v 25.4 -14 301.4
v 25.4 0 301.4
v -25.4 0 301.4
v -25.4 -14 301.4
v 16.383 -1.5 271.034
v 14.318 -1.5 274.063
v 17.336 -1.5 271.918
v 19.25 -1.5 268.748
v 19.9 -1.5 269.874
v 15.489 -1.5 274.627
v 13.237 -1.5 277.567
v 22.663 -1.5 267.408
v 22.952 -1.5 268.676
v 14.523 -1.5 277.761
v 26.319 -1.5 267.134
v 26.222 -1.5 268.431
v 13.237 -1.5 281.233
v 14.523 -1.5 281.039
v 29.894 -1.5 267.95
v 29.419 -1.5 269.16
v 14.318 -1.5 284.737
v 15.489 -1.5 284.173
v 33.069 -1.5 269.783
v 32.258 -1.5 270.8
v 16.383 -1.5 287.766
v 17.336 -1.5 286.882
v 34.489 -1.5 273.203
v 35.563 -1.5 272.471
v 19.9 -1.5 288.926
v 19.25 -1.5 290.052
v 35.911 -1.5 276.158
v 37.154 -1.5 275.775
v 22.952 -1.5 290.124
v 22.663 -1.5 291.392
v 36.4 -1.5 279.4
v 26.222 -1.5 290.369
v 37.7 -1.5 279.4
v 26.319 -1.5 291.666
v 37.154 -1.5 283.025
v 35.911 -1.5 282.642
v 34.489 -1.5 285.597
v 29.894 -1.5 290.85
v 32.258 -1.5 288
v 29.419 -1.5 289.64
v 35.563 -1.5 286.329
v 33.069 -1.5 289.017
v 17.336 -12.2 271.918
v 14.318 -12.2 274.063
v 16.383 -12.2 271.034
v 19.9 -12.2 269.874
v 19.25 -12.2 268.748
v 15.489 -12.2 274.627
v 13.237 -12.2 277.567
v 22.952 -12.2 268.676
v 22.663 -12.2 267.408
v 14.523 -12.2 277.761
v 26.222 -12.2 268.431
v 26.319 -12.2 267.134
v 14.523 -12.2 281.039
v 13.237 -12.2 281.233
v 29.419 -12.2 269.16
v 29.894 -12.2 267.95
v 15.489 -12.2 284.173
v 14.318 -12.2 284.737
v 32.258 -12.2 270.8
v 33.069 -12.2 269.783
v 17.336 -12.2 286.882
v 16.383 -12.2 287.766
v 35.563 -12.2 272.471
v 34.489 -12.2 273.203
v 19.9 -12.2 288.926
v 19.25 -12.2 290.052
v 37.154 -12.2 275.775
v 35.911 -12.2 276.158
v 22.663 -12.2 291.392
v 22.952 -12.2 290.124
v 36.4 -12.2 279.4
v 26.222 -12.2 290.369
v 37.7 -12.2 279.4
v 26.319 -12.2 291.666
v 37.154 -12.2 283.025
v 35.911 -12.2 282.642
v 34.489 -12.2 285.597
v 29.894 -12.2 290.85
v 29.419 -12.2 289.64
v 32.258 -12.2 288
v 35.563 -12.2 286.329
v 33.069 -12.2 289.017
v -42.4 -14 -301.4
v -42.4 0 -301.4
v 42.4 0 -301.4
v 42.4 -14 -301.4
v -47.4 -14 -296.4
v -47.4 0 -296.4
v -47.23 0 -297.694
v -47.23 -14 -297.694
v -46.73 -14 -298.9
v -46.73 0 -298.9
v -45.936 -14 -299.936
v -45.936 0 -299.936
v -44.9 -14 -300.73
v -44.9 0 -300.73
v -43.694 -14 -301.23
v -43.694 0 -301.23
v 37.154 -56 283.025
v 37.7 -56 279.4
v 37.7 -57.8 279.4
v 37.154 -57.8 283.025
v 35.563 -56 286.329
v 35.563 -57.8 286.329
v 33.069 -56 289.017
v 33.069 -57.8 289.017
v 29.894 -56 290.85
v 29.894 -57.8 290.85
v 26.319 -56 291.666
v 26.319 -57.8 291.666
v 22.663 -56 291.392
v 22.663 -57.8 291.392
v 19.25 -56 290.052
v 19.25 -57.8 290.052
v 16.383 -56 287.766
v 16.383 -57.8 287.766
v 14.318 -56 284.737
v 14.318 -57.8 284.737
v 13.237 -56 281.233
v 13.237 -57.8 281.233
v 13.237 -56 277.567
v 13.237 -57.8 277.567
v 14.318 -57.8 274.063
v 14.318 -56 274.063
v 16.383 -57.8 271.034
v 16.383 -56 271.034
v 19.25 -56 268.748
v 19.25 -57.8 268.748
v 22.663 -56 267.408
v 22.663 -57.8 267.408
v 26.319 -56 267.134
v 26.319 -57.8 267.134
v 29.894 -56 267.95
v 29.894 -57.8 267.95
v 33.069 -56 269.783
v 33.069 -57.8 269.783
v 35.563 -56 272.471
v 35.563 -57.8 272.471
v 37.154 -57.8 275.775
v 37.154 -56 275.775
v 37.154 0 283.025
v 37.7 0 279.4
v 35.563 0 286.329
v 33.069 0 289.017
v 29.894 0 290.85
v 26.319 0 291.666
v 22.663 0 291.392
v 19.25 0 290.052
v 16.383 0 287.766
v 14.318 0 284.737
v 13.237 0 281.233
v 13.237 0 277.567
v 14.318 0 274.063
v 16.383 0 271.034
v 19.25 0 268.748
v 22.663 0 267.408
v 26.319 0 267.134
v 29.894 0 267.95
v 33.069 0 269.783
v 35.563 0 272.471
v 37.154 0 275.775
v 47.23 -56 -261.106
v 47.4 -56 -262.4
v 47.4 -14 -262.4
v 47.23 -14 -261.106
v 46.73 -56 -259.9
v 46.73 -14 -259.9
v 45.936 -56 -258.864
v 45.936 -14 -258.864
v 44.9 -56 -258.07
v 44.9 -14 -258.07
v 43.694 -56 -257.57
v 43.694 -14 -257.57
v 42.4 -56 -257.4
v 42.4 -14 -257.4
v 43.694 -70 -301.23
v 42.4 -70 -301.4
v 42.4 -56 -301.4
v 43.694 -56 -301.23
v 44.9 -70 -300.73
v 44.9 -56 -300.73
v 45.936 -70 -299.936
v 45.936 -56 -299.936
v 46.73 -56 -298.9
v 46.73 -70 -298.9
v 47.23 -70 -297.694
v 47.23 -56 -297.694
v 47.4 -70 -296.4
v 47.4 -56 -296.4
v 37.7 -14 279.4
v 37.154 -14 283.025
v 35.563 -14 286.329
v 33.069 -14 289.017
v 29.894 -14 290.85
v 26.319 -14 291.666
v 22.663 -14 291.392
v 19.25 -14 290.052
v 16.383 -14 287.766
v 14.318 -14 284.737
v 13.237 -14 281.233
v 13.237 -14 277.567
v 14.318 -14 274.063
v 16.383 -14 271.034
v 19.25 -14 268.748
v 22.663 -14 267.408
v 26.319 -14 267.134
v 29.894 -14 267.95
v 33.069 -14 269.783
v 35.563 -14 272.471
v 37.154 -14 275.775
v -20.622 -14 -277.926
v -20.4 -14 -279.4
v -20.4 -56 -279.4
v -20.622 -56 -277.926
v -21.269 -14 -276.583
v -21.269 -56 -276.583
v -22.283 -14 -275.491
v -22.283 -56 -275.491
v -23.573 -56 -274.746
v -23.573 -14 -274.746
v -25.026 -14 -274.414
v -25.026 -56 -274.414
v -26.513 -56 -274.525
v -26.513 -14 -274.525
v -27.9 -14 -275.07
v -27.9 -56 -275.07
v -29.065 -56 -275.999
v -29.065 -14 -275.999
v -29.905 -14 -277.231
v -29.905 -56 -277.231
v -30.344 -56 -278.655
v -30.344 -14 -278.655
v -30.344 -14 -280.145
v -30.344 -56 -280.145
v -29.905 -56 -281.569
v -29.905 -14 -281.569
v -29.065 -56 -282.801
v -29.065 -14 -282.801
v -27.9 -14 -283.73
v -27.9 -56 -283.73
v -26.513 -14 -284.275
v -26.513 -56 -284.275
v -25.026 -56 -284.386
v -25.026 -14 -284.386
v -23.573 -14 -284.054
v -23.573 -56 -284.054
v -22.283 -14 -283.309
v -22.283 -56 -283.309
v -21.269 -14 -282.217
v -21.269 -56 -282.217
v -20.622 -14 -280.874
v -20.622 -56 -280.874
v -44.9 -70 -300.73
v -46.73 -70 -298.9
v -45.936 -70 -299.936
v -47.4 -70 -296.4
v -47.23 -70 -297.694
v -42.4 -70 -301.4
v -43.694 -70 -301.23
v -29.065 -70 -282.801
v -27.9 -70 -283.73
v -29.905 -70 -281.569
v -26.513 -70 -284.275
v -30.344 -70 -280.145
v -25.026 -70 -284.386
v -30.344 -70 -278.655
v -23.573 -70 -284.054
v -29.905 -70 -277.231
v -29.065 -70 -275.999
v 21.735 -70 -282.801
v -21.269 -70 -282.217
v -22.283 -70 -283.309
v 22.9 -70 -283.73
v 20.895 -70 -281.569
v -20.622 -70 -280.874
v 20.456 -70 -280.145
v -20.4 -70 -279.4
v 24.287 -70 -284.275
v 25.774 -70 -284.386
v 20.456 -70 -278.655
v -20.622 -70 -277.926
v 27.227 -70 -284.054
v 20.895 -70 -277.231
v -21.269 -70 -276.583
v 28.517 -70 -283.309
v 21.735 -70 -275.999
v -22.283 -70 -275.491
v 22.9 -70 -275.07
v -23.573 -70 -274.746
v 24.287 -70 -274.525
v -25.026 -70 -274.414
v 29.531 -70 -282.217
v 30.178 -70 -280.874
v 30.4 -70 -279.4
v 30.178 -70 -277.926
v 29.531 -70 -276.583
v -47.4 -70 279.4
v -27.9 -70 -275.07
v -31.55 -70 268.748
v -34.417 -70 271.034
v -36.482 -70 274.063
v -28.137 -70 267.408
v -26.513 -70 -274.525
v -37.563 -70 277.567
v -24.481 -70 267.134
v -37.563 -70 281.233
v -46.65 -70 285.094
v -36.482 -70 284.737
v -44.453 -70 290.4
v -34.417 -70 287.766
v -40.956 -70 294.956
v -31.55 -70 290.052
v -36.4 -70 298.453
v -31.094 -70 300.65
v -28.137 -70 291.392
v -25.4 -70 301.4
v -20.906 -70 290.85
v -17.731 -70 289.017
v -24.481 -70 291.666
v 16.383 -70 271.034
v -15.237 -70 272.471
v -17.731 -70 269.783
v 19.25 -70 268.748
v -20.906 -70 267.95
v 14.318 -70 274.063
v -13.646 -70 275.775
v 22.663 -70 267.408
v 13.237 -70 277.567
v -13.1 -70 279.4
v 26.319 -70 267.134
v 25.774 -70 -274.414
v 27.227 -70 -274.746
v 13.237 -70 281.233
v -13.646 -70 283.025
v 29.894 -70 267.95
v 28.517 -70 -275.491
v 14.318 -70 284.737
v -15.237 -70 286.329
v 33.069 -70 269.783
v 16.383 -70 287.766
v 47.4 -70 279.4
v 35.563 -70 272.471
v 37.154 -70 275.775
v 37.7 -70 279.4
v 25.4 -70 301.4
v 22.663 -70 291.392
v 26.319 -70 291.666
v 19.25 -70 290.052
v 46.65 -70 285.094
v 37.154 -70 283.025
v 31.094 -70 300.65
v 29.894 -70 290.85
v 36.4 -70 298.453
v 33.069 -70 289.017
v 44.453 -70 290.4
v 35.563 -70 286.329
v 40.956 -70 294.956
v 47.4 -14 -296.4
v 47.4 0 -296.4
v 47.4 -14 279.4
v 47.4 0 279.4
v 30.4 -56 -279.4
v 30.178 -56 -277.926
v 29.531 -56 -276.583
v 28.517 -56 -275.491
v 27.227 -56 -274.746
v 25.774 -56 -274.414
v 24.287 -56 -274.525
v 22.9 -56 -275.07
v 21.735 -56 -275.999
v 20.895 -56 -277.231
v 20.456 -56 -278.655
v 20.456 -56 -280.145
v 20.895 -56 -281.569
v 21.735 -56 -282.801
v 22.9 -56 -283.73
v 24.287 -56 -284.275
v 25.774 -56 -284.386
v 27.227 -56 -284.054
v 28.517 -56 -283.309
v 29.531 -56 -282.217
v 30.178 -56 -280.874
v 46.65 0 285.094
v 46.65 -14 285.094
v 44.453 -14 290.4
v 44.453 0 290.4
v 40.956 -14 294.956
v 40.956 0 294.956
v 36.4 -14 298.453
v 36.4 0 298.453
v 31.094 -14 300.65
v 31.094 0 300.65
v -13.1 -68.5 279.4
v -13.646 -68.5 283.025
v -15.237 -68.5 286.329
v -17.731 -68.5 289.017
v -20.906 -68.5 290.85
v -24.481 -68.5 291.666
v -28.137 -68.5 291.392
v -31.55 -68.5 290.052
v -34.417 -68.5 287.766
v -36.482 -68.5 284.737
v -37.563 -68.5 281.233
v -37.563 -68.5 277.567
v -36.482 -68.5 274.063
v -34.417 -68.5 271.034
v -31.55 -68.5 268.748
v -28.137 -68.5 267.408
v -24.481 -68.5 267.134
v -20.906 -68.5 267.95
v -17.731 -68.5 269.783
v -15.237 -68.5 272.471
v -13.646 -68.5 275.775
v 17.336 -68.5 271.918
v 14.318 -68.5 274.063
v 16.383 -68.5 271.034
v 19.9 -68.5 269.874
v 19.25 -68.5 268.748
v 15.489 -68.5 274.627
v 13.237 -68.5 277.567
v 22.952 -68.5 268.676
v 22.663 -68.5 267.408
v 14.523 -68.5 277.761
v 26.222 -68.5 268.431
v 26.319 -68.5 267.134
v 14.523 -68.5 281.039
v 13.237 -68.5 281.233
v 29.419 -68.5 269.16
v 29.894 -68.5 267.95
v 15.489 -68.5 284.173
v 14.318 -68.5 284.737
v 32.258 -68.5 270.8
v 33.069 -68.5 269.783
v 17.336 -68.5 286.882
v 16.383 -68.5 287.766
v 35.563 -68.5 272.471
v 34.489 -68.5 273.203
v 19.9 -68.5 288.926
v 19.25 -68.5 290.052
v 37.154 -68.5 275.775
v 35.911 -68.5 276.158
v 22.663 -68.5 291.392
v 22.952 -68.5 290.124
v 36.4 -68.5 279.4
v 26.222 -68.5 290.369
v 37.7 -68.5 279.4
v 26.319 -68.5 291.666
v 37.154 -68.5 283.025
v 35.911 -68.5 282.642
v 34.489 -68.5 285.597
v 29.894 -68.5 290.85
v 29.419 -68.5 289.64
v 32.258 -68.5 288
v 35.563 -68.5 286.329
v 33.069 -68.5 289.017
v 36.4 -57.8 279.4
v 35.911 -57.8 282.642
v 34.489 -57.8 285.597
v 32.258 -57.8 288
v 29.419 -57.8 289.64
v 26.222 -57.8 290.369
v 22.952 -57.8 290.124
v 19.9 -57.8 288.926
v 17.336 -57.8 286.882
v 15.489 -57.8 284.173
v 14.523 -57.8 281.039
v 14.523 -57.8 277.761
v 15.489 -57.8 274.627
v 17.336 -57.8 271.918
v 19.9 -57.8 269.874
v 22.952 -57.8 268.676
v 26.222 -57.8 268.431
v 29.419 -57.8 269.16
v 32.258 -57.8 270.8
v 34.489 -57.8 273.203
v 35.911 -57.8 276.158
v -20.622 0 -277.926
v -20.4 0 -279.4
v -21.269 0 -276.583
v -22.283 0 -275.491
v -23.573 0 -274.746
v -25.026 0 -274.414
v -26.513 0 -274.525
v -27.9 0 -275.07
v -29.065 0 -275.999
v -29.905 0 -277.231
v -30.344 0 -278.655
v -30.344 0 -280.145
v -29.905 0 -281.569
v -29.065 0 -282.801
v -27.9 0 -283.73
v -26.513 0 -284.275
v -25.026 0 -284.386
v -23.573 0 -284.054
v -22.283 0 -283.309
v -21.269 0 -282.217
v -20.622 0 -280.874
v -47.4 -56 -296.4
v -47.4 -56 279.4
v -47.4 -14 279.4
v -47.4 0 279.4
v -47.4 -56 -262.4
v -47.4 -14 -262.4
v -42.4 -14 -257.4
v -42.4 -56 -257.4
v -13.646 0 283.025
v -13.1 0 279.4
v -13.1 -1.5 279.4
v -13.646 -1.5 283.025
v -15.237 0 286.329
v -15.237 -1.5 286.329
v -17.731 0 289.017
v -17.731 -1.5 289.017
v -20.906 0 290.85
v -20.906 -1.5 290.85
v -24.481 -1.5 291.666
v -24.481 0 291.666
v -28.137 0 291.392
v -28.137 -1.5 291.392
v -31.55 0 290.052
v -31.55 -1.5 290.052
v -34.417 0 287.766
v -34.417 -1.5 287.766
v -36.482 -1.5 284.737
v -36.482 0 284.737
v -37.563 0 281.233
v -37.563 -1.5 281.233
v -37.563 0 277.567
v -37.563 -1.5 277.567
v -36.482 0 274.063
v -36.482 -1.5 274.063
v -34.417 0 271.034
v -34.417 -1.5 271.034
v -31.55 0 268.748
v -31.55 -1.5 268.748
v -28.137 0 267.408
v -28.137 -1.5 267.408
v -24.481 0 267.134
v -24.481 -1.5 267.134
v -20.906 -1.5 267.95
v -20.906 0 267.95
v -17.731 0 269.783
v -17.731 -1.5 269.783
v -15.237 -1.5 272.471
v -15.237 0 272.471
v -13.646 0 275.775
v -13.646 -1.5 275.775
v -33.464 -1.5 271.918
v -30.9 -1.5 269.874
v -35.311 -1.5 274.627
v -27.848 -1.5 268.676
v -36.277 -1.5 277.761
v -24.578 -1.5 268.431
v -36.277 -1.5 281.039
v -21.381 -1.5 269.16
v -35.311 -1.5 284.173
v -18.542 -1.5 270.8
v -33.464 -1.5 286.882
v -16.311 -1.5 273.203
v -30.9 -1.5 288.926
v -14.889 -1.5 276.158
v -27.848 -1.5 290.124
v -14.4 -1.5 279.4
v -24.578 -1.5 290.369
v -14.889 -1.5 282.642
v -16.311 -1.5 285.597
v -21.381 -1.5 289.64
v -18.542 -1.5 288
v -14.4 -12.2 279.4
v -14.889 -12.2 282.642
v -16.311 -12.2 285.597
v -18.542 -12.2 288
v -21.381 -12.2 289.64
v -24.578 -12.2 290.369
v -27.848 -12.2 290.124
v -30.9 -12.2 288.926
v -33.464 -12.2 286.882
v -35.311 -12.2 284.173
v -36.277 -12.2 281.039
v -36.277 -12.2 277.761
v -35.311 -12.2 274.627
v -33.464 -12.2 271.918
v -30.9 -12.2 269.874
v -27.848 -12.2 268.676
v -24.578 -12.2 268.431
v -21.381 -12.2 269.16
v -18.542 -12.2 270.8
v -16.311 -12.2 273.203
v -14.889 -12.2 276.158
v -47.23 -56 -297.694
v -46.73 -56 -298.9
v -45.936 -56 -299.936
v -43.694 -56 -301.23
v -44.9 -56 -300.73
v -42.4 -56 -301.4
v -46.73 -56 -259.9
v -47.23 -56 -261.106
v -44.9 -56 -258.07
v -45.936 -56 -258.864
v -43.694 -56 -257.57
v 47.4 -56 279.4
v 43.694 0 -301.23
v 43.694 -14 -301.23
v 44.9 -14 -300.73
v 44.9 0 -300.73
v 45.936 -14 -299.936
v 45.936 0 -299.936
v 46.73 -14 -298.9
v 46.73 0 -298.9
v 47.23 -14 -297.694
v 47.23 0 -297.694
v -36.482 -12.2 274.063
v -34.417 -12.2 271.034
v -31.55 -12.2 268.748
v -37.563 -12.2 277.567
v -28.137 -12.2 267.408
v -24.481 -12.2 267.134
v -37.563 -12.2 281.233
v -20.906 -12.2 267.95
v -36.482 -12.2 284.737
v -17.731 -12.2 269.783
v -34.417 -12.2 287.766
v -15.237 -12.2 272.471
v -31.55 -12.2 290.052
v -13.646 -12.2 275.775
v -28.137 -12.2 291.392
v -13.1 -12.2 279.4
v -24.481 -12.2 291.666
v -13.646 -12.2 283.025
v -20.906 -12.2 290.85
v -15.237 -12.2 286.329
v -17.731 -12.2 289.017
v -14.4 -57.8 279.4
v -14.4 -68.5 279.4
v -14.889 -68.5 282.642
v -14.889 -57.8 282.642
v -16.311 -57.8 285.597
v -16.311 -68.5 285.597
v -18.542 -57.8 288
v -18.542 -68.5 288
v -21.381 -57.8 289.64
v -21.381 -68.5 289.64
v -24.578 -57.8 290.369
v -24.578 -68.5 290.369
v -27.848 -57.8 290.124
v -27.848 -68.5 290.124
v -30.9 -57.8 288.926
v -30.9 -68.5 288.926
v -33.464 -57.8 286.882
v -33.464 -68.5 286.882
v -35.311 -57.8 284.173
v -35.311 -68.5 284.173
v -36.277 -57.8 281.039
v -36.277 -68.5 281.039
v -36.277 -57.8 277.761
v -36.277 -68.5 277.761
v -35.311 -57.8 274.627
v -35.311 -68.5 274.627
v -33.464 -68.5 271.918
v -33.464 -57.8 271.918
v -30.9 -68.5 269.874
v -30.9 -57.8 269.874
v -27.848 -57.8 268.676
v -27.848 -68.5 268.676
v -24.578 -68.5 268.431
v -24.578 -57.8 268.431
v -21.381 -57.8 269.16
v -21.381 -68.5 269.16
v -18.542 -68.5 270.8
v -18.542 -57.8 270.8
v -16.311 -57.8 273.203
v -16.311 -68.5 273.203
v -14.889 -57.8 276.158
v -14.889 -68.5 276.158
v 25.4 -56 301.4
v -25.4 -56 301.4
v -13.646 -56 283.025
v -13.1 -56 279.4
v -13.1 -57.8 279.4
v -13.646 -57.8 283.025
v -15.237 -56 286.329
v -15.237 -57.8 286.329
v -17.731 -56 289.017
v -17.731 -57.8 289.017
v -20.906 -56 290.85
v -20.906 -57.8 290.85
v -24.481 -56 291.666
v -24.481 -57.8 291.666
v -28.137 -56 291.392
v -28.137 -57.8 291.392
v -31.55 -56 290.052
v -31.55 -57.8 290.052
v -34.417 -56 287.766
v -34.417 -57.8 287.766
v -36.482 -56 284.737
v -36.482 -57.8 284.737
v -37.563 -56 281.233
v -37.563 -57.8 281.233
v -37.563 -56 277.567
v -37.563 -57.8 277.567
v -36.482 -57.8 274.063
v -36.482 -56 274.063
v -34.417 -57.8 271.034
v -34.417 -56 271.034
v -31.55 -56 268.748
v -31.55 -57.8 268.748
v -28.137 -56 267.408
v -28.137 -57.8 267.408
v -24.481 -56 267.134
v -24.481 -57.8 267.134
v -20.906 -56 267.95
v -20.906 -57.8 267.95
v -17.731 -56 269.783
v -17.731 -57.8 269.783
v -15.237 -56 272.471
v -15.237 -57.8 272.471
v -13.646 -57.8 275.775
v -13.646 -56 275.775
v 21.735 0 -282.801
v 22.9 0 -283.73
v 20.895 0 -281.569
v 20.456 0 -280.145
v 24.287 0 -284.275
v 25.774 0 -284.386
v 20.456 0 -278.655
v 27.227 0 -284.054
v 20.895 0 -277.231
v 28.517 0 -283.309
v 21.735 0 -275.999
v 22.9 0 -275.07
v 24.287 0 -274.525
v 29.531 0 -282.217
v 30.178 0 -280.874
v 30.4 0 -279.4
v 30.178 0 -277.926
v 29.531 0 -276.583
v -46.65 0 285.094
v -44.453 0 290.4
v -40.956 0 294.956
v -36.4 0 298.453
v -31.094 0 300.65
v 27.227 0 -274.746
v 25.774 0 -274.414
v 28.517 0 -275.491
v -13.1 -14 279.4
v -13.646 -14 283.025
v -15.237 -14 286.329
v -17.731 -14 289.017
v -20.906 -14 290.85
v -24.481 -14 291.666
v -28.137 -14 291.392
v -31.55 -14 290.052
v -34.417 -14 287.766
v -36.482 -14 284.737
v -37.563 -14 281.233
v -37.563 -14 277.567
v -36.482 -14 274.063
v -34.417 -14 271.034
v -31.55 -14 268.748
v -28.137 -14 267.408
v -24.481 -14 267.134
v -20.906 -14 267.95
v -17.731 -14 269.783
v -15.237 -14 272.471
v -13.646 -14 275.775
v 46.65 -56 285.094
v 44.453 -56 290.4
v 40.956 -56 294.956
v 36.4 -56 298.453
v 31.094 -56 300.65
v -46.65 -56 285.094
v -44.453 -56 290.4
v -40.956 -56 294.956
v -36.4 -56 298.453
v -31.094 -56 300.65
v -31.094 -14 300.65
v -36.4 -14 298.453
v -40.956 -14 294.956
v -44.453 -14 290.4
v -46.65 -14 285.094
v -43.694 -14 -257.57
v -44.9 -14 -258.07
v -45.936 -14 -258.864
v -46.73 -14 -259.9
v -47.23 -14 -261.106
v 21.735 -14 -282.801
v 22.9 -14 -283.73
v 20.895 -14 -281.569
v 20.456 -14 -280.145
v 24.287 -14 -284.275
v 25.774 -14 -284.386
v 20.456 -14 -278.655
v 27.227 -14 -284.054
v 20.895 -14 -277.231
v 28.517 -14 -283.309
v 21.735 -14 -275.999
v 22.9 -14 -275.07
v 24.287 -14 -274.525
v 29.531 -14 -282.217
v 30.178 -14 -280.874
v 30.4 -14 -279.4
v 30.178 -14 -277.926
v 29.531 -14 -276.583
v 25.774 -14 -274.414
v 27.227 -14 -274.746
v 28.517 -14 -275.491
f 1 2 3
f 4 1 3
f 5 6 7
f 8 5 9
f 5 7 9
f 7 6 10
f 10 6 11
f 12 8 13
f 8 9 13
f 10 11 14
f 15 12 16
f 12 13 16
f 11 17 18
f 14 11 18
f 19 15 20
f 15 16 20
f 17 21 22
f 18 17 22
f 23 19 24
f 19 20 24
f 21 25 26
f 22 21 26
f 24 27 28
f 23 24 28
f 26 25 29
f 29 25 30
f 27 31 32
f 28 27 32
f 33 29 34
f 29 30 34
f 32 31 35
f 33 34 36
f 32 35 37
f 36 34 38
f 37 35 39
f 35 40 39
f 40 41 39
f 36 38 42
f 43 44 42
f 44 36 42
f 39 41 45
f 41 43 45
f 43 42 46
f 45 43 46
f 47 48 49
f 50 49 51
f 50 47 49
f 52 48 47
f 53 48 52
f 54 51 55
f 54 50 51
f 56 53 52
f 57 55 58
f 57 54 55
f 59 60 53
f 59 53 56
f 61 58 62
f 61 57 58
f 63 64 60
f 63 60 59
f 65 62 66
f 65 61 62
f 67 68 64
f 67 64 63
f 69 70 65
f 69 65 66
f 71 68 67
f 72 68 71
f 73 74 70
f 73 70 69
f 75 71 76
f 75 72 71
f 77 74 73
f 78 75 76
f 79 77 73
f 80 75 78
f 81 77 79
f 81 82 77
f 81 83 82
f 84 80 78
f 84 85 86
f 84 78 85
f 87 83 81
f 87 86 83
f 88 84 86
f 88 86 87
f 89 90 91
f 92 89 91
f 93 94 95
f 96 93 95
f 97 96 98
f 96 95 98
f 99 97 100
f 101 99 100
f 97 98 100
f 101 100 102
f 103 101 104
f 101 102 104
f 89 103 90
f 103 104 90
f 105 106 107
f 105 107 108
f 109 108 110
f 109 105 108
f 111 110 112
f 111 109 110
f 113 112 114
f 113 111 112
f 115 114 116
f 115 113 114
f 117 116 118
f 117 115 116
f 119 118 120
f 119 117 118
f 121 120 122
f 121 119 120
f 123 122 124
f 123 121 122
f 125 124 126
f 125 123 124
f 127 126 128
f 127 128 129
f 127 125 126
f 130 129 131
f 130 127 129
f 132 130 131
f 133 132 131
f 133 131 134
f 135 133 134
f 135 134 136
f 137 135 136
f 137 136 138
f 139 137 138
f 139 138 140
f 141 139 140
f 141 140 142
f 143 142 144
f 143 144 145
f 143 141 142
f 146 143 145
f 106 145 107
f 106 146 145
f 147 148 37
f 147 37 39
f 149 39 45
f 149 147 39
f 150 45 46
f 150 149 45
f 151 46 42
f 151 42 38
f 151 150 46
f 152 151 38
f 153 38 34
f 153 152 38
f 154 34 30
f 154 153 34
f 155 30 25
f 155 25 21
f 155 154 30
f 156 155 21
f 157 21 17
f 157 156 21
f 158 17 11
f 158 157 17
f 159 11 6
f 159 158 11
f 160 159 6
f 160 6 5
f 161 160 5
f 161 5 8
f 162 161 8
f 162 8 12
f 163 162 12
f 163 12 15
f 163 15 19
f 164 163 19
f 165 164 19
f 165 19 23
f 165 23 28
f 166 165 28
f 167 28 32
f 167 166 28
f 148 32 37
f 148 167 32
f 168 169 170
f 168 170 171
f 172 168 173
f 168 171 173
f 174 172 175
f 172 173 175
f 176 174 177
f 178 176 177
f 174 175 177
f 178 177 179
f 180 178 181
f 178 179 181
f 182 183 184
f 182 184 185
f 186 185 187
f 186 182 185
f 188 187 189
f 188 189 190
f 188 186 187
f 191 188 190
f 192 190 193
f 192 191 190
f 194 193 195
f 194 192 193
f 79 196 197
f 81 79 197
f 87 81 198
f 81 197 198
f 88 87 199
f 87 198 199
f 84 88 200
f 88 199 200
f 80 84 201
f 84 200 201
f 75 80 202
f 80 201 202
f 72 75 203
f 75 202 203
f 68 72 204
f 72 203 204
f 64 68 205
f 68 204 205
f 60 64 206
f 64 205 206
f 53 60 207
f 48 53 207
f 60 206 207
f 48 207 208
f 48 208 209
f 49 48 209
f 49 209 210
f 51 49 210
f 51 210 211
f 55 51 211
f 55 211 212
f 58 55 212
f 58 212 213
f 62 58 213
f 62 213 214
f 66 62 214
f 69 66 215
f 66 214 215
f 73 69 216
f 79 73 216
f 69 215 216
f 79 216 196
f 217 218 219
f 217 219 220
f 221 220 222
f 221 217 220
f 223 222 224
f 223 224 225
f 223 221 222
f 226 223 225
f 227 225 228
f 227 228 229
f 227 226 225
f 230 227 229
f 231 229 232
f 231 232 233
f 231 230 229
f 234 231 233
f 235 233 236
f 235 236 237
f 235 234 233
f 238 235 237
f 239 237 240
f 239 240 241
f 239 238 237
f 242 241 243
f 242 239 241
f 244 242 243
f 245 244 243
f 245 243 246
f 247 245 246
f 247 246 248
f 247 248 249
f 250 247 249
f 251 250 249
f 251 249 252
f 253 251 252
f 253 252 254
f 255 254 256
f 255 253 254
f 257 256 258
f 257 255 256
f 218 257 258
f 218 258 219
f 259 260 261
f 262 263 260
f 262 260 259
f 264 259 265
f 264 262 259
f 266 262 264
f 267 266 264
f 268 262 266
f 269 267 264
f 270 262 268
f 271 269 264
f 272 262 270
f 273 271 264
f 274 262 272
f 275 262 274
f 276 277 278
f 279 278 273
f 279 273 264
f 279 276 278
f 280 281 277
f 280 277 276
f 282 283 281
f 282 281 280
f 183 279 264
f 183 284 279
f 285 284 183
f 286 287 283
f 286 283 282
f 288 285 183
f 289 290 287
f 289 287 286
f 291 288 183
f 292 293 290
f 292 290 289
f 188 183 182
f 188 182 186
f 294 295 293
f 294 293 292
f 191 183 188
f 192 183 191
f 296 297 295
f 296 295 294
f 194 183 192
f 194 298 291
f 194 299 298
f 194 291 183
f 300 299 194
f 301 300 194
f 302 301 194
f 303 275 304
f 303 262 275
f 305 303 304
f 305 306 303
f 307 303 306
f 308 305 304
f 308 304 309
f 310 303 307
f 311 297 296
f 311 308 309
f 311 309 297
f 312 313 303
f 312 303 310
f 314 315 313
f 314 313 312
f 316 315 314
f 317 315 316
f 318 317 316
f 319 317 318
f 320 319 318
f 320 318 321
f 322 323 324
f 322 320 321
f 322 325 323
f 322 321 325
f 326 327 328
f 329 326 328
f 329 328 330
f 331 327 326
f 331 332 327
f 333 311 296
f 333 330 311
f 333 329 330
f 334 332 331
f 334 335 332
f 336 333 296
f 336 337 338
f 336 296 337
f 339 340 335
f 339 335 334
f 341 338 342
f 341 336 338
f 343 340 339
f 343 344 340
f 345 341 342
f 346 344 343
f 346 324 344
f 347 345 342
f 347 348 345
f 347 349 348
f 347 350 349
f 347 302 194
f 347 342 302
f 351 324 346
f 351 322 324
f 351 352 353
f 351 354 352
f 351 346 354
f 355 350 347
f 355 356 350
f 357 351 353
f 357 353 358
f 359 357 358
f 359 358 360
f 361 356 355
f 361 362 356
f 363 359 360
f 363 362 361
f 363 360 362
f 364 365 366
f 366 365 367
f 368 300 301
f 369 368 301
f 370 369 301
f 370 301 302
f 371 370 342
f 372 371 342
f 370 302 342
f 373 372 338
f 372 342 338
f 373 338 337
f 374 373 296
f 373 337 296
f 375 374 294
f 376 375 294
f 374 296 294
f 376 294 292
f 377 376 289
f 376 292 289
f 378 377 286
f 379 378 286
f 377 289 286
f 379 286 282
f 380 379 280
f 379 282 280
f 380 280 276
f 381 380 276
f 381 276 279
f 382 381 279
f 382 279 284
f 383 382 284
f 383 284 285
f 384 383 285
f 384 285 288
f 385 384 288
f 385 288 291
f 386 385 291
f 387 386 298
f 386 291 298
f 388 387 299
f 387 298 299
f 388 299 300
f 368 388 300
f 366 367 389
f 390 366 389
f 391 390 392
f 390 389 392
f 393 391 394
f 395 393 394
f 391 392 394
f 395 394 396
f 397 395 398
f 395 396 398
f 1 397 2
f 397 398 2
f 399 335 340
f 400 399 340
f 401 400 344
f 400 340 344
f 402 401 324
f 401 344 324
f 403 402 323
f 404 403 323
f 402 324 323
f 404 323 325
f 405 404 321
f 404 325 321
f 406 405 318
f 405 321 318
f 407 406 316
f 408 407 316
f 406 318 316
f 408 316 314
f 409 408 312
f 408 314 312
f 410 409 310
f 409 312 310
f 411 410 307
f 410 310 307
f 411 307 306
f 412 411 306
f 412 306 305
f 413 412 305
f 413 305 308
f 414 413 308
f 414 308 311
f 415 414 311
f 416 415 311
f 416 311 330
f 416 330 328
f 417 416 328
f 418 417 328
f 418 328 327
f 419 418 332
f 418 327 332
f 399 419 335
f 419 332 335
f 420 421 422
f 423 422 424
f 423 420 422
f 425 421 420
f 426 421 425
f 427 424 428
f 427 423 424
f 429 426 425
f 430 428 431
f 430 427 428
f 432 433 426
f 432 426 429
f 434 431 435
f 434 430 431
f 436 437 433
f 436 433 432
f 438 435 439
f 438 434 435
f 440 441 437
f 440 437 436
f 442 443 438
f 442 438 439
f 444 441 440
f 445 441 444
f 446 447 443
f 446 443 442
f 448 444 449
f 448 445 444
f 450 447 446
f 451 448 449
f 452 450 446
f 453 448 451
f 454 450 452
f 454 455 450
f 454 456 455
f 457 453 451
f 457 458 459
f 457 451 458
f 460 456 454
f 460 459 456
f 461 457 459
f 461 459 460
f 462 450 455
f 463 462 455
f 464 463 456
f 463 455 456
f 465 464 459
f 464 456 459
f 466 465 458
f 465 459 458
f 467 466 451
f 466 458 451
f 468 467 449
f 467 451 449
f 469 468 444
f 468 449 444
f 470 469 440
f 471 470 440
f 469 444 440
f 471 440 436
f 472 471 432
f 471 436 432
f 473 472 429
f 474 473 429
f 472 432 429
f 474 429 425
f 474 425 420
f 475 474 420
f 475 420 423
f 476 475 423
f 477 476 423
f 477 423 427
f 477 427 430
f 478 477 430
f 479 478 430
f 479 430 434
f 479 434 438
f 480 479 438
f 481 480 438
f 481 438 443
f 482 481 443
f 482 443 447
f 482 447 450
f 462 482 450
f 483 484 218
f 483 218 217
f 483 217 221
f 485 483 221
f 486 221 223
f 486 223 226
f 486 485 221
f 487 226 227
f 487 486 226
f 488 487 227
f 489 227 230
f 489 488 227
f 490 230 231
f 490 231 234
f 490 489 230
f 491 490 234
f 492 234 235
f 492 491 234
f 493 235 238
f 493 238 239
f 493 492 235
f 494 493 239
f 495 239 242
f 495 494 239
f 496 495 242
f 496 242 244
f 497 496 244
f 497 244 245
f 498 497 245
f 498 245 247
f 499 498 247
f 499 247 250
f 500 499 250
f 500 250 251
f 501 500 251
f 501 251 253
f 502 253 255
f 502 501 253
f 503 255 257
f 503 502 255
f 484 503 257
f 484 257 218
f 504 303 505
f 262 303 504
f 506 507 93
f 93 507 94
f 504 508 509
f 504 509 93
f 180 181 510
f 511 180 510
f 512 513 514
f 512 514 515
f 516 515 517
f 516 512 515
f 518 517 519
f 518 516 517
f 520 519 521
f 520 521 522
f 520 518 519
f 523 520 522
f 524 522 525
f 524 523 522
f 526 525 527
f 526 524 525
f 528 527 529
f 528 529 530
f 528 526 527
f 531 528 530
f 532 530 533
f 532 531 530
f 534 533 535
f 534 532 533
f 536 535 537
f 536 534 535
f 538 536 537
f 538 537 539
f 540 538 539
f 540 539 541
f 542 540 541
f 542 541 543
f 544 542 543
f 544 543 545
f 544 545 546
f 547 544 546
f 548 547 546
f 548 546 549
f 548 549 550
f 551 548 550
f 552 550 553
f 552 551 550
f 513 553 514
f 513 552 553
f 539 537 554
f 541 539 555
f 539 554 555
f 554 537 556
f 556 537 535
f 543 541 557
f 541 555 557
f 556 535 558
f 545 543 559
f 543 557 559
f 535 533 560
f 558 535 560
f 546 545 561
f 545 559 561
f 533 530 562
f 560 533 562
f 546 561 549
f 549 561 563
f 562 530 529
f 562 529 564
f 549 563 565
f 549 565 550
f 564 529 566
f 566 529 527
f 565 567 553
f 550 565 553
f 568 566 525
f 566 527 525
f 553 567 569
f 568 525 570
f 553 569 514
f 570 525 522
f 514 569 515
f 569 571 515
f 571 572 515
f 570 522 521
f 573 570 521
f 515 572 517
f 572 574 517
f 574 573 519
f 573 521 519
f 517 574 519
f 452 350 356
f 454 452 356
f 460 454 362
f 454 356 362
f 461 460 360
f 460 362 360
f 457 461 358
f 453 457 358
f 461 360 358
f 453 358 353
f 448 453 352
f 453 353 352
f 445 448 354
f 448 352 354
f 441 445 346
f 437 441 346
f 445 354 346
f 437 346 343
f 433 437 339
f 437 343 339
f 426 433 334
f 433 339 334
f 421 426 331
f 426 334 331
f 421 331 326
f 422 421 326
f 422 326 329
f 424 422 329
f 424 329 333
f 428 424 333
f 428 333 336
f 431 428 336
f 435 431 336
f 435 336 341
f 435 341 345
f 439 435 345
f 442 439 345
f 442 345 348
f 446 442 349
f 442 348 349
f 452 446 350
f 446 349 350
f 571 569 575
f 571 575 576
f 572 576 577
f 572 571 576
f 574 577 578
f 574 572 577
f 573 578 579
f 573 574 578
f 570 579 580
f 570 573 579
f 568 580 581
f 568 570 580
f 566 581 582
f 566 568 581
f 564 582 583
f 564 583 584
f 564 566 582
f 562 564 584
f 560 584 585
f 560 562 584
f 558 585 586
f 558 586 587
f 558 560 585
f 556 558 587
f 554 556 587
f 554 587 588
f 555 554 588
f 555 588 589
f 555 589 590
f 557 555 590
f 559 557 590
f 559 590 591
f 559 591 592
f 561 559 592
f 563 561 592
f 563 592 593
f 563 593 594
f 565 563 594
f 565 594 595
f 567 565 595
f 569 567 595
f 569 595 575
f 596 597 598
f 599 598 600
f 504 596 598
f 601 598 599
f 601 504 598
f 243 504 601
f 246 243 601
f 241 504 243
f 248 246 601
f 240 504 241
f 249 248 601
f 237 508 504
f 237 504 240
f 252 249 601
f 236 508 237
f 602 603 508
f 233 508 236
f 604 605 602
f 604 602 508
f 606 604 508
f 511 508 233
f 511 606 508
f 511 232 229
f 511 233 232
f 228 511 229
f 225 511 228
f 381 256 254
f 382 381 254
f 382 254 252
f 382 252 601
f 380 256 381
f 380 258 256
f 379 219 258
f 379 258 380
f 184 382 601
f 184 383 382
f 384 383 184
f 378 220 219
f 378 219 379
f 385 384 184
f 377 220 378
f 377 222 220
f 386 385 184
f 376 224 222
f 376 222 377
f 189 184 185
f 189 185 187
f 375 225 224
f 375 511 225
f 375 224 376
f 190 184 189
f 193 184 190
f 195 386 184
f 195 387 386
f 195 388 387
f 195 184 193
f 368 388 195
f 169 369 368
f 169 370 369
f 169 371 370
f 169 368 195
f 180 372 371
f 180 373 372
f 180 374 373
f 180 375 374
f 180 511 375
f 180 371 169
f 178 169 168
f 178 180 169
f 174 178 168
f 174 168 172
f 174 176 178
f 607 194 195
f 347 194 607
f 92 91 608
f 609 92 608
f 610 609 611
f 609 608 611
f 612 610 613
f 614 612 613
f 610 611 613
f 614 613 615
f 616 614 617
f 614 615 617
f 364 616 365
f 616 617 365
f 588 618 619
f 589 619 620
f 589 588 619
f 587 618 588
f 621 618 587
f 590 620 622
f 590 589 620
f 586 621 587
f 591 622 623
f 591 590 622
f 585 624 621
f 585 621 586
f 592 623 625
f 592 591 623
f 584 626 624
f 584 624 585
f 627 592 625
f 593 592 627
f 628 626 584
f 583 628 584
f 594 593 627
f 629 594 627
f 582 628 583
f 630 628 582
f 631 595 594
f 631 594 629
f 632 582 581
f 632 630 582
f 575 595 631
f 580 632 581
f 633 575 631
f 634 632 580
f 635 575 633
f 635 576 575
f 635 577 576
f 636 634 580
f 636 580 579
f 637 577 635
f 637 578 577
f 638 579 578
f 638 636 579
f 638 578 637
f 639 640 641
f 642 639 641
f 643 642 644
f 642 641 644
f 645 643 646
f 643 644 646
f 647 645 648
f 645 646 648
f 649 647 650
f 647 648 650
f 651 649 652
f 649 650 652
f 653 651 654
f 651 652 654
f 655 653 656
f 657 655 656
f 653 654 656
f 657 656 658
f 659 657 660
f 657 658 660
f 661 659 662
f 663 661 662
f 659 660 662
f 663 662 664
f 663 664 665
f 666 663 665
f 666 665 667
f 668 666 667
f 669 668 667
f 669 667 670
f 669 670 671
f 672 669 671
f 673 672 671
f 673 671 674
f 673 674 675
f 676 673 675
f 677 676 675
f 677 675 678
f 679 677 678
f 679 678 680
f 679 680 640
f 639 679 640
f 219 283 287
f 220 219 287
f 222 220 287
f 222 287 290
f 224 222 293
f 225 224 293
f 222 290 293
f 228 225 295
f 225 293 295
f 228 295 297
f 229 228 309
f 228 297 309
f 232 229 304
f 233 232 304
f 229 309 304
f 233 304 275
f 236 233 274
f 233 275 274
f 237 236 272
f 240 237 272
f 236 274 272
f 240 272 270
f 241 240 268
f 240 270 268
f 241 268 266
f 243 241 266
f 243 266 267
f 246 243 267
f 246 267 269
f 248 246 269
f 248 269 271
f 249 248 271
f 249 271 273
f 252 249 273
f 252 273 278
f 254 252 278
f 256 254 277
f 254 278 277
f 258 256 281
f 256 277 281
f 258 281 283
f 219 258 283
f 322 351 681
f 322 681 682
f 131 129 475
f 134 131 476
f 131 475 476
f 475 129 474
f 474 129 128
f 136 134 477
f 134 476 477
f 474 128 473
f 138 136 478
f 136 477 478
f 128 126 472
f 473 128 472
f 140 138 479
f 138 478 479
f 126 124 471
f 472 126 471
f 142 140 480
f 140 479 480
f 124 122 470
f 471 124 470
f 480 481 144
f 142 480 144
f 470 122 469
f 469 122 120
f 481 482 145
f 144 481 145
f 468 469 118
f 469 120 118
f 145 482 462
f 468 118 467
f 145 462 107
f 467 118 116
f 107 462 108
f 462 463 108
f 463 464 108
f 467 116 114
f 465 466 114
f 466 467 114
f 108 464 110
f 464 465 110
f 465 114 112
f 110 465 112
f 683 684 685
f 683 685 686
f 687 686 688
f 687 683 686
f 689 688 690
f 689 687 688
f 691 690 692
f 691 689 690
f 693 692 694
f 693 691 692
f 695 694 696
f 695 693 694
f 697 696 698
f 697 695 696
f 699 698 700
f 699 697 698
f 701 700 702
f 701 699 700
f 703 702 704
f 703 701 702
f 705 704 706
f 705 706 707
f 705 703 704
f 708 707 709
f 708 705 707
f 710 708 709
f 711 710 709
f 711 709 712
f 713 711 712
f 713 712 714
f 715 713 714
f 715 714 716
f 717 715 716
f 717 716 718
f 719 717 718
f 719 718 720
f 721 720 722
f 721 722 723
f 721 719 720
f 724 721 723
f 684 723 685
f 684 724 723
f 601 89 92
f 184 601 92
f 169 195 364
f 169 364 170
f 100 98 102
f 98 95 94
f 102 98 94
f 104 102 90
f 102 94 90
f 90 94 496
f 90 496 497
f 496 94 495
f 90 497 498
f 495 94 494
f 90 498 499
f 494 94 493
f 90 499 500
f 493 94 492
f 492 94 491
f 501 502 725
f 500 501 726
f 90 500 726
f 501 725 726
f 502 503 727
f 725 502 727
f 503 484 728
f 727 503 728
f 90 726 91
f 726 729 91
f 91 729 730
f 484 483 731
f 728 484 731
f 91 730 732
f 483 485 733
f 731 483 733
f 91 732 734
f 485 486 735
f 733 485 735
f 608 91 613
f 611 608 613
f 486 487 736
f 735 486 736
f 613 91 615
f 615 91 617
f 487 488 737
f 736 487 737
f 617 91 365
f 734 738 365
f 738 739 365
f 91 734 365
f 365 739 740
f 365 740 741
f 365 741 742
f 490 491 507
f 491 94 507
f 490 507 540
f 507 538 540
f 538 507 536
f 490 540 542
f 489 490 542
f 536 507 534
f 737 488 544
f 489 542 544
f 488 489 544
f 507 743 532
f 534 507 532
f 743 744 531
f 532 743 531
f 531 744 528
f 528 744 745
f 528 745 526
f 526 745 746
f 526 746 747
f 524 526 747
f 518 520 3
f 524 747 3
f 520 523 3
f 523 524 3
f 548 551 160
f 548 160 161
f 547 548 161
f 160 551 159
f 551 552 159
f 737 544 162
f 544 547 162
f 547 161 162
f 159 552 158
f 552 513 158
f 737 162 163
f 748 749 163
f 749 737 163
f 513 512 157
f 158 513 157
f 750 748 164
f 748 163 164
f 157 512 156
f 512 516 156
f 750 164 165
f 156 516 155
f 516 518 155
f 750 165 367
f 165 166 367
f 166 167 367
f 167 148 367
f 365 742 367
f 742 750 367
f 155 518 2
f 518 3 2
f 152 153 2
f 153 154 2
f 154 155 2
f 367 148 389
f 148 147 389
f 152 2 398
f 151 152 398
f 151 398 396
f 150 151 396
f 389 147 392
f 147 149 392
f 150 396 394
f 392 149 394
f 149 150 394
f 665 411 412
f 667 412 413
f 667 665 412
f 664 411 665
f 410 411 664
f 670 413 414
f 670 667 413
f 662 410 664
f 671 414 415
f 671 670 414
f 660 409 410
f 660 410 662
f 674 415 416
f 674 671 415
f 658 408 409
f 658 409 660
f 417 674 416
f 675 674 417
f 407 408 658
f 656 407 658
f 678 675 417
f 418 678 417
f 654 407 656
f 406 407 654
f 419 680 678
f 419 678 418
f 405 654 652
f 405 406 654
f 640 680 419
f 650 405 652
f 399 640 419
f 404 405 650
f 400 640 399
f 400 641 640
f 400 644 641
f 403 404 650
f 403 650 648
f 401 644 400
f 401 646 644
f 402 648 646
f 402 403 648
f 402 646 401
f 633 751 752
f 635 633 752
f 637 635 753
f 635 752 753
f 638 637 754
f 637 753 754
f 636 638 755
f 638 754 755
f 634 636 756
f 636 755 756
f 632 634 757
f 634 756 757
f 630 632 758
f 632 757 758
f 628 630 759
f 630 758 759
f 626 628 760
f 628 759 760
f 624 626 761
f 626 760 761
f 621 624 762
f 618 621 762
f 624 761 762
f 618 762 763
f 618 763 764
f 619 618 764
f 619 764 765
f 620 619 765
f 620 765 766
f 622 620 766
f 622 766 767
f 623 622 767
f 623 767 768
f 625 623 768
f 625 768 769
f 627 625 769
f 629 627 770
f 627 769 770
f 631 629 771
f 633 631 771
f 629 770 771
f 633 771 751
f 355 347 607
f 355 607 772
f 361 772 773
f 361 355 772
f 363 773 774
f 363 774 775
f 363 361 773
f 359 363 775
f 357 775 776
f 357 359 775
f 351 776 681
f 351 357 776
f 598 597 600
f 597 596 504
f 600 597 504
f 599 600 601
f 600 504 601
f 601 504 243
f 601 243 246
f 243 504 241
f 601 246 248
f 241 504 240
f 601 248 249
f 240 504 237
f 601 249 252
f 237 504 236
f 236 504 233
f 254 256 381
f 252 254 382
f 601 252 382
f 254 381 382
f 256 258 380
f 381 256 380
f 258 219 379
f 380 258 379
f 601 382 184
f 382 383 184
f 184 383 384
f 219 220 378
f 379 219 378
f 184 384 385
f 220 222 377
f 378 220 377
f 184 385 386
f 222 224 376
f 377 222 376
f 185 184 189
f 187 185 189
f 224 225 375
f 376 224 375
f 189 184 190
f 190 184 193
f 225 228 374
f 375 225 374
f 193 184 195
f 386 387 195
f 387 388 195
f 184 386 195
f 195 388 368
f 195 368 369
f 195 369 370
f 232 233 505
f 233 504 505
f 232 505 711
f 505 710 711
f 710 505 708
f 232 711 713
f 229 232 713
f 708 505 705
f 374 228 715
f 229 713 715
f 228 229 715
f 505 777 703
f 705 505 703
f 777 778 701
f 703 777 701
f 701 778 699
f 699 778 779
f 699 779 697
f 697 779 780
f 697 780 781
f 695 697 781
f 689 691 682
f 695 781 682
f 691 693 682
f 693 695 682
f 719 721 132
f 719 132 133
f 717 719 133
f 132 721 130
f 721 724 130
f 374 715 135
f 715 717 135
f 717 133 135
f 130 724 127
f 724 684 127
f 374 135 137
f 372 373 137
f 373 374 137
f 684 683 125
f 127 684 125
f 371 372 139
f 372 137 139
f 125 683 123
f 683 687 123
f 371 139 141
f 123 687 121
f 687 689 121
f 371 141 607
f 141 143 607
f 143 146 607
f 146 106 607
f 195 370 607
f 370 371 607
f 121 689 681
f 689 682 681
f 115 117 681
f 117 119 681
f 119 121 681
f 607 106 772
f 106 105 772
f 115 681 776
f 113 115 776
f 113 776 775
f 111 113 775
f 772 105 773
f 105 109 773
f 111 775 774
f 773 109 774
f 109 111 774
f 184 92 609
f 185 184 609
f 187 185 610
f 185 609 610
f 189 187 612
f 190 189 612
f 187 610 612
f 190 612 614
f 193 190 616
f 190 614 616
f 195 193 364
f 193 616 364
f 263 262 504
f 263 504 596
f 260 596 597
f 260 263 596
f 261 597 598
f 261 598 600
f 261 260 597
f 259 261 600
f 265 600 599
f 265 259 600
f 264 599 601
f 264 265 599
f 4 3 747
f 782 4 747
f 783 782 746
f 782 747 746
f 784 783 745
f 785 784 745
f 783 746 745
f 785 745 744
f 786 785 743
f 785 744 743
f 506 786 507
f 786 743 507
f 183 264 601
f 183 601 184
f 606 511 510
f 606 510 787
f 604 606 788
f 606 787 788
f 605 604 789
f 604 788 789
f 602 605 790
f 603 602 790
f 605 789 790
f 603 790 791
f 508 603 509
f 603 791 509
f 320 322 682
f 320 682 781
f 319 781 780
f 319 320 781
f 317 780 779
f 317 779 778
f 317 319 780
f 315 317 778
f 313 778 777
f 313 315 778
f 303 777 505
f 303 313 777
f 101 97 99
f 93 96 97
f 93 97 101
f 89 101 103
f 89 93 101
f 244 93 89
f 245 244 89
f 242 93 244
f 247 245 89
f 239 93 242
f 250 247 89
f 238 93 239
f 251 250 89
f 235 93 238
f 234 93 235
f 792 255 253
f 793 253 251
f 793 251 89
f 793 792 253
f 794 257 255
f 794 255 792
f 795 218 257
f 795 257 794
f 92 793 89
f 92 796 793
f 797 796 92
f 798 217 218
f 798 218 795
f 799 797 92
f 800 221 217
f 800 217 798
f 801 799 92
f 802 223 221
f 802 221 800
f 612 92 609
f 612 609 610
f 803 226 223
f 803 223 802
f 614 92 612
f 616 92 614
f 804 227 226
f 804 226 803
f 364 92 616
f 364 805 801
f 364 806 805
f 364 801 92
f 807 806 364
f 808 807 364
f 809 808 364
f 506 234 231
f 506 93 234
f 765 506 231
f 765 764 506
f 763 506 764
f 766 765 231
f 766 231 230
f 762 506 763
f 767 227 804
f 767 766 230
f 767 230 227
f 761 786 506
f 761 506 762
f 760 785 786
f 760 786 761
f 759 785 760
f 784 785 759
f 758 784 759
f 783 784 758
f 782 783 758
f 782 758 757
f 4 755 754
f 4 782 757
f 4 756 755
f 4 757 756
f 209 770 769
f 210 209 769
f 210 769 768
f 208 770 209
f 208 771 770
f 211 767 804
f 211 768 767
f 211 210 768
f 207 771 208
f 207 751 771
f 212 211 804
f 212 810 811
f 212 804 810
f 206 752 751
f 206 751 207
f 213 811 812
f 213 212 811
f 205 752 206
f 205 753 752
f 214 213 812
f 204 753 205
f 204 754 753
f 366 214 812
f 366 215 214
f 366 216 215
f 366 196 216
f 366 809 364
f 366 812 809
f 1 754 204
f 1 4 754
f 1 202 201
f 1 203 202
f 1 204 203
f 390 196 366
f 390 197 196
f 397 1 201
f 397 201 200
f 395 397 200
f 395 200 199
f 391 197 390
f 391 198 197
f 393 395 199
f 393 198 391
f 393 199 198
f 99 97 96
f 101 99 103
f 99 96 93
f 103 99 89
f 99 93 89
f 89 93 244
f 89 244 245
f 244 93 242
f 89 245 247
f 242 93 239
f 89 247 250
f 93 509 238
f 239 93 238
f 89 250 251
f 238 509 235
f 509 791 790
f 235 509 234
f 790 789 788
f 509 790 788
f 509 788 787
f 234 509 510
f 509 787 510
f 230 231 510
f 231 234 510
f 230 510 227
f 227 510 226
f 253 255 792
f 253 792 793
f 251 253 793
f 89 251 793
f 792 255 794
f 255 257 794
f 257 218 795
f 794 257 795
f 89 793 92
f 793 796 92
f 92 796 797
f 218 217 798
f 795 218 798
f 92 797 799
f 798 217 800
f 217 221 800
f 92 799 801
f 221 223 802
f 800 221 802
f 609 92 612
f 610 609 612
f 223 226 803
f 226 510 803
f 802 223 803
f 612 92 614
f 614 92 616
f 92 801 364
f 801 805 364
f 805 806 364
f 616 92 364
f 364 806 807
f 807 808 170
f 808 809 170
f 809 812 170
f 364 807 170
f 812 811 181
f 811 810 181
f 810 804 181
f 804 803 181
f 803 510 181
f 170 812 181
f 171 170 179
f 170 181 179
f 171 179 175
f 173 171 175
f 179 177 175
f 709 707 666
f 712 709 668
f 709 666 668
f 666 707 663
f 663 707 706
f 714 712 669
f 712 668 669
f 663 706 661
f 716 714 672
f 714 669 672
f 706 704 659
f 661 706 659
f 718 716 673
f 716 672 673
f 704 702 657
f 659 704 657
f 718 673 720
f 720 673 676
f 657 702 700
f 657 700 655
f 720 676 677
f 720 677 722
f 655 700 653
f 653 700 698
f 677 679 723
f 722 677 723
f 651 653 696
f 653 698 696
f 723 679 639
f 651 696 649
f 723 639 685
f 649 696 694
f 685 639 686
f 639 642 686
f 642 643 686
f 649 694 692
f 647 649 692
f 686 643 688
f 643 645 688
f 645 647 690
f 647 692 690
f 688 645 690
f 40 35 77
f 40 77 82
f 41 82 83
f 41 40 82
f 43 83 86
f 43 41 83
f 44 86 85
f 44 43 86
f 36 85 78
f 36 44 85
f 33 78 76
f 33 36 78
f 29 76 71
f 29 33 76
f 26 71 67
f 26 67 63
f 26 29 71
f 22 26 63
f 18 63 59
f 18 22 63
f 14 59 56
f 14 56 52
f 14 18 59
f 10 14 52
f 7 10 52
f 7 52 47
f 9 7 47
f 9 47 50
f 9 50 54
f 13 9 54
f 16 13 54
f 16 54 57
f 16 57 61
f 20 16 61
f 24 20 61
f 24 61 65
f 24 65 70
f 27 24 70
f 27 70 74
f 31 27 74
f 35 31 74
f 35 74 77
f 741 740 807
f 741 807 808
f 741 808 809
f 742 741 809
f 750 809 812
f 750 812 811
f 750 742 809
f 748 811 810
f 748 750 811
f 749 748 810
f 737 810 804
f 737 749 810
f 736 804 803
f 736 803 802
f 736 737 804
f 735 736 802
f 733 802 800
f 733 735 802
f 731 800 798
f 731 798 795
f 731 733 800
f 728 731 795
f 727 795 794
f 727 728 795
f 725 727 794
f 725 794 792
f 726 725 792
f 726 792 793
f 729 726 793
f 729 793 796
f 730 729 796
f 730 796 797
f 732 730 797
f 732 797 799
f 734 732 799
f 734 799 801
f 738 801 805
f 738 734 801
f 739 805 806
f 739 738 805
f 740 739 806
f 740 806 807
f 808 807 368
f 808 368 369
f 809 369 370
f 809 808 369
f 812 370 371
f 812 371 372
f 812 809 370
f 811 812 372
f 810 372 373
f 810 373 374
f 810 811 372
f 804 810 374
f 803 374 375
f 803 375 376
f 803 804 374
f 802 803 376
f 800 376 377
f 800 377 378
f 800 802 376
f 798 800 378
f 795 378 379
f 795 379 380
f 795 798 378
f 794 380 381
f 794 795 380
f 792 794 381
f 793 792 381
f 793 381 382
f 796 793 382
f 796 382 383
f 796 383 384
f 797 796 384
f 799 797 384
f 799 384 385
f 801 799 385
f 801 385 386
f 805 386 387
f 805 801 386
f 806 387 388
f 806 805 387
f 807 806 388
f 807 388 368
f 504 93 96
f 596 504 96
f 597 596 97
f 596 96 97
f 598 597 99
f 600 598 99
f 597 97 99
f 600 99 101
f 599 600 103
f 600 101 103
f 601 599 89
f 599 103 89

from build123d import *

# Parameters (mm, degrees)
F0_R     = 5
F0_R_2   = 12.3
F0_R_3   = 11
F1_DEPTH = 14
F2_DEPTH = 1.5
F3_R     = 12.3
F3_R_2   = 11
F4_DEPTH = 1.8
F5_R     = 5
F6_DEPTH = 42


with BuildPart() as f1:
    # F0 (on Front) → F1 (new body)
    with BuildSketch(Plane.XZ):
        with BuildLine():
            Line((25.4, 301.4), (-25.4, 301.4))
            ThreePointArc((-25.4, 301.4), (-40.956349, 294.956349), (-47.4, 279.4))
            Line((-47.4, 279.4), (-47.4, -296.4))
            ThreePointArc((-47.4, -296.4), (-45.935534, -299.935534), (-42.4, -301.4))
            Line((-42.4, -301.4), (42.4, -301.4))
            ThreePointArc((42.4, -301.4), (45.935534, -299.935534), (47.4, -296.4))
            Line((47.4, -296.4), (47.4, 279.4))
            ThreePointArc((47.4, 279.4), (40.956349, 294.956349), (25.4, 301.4))
        make_face()
        with Locations((-25.4, -279.4)):
            Circle(F0_R, mode=Mode.SUBTRACT)
        with Locations((25.4, -279.4)):
            Circle(F0_R, mode=Mode.SUBTRACT)
        with Locations((-25.4, 279.4)):
            Circle(F0_R_2, mode=Mode.SUBTRACT)
        with Locations((25.4, 279.4)):
            Circle(F0_R_2, mode=Mode.SUBTRACT)
        with Locations((-25.4, 279.4)):
            Circle(F0_R_2)
        with Locations((-25.4, 279.4)):
            Circle(F0_R_3, mode=Mode.SUBTRACT)
        with Locations((25.4, 279.4)):
            Circle(F0_R_2)
        with Locations((25.4, 279.4)):
            Circle(F0_R_3, mode=Mode.SUBTRACT)
    extrude(amount=F1_DEPTH)

    # F0 (on Front) → F2 (cut)
    with BuildSketch(Plane.XZ):
        with Locations((-25.4, 279.4)):
            Circle(F0_R_2)
        with Locations((-25.4, 279.4)):
            Circle(F0_R_3, mode=Mode.SUBTRACT)
        with Locations((25.4, 279.4)):
            Circle(F0_R_2)
        with Locations((25.4, 279.4)):
            Circle(F0_R_3, mode=Mode.SUBTRACT)
    extrude(amount=F2_DEPTH, mode=Mode.SUBTRACT)

    # F3 (on face) → F4 (cut)
    with BuildSketch(Plane.XZ.offset(14)):
        with Locations((-25.4, 279.4)):
            Circle(F3_R)
        with Locations((-25.4, 279.4)):
            Circle(F3_R_2, mode=Mode.SUBTRACT)
        with Locations((25.4, 279.4)):
            Circle(F3_R)
        with Locations((25.4, 279.4)):
            Circle(F3_R_2, mode=Mode.SUBTRACT)
    extrude(amount=-F4_DEPTH, mode=Mode.SUBTRACT)


with BuildPart() as f6:
    # F5 (on face) → F6 (new body)
    with BuildSketch(Plane.XZ.offset(14)):
        with BuildLine():
            ThreePointArc((-42.4, -257.4), (-45.935534, -258.864466), (-47.4, -262.4))
            Line((-47.4, -262.4), (-47.4, -296.4))
            ThreePointArc((-47.4, -296.4), (-45.935534, -299.935534), (-42.4, -301.4))
            Line((-42.4, -301.4), (42.4, -301.4))
            ThreePointArc((42.4, -301.4), (45.935534, -299.935534), (47.4, -296.4))
            Line((47.4, -296.4), (47.4, -262.4))
            ThreePointArc((47.4, -262.4), (45.935534, -258.864466), (42.4, -257.4))
            Line((42.4, -257.4), (-42.4, -257.4))
        make_face()
        with Locations((-25.4, -279.4)):
            Circle(F5_R, mode=Mode.SUBTRACT)
        with Locations((25.4, -279.4)):
            Circle(F5_R, mode=Mode.SUBTRACT)
    extrude(amount=F6_DEPTH)


with BuildPart() as f8_1:
    # F8: instance of F1
    add(f1.part.mirror(Plane(origin=(0, -35, -5.017496), x_dir=(1, 0, 0), z_dir=(0, -1, 0))))


solid = Compound([f1.part, f6.part, f8_1.part])
